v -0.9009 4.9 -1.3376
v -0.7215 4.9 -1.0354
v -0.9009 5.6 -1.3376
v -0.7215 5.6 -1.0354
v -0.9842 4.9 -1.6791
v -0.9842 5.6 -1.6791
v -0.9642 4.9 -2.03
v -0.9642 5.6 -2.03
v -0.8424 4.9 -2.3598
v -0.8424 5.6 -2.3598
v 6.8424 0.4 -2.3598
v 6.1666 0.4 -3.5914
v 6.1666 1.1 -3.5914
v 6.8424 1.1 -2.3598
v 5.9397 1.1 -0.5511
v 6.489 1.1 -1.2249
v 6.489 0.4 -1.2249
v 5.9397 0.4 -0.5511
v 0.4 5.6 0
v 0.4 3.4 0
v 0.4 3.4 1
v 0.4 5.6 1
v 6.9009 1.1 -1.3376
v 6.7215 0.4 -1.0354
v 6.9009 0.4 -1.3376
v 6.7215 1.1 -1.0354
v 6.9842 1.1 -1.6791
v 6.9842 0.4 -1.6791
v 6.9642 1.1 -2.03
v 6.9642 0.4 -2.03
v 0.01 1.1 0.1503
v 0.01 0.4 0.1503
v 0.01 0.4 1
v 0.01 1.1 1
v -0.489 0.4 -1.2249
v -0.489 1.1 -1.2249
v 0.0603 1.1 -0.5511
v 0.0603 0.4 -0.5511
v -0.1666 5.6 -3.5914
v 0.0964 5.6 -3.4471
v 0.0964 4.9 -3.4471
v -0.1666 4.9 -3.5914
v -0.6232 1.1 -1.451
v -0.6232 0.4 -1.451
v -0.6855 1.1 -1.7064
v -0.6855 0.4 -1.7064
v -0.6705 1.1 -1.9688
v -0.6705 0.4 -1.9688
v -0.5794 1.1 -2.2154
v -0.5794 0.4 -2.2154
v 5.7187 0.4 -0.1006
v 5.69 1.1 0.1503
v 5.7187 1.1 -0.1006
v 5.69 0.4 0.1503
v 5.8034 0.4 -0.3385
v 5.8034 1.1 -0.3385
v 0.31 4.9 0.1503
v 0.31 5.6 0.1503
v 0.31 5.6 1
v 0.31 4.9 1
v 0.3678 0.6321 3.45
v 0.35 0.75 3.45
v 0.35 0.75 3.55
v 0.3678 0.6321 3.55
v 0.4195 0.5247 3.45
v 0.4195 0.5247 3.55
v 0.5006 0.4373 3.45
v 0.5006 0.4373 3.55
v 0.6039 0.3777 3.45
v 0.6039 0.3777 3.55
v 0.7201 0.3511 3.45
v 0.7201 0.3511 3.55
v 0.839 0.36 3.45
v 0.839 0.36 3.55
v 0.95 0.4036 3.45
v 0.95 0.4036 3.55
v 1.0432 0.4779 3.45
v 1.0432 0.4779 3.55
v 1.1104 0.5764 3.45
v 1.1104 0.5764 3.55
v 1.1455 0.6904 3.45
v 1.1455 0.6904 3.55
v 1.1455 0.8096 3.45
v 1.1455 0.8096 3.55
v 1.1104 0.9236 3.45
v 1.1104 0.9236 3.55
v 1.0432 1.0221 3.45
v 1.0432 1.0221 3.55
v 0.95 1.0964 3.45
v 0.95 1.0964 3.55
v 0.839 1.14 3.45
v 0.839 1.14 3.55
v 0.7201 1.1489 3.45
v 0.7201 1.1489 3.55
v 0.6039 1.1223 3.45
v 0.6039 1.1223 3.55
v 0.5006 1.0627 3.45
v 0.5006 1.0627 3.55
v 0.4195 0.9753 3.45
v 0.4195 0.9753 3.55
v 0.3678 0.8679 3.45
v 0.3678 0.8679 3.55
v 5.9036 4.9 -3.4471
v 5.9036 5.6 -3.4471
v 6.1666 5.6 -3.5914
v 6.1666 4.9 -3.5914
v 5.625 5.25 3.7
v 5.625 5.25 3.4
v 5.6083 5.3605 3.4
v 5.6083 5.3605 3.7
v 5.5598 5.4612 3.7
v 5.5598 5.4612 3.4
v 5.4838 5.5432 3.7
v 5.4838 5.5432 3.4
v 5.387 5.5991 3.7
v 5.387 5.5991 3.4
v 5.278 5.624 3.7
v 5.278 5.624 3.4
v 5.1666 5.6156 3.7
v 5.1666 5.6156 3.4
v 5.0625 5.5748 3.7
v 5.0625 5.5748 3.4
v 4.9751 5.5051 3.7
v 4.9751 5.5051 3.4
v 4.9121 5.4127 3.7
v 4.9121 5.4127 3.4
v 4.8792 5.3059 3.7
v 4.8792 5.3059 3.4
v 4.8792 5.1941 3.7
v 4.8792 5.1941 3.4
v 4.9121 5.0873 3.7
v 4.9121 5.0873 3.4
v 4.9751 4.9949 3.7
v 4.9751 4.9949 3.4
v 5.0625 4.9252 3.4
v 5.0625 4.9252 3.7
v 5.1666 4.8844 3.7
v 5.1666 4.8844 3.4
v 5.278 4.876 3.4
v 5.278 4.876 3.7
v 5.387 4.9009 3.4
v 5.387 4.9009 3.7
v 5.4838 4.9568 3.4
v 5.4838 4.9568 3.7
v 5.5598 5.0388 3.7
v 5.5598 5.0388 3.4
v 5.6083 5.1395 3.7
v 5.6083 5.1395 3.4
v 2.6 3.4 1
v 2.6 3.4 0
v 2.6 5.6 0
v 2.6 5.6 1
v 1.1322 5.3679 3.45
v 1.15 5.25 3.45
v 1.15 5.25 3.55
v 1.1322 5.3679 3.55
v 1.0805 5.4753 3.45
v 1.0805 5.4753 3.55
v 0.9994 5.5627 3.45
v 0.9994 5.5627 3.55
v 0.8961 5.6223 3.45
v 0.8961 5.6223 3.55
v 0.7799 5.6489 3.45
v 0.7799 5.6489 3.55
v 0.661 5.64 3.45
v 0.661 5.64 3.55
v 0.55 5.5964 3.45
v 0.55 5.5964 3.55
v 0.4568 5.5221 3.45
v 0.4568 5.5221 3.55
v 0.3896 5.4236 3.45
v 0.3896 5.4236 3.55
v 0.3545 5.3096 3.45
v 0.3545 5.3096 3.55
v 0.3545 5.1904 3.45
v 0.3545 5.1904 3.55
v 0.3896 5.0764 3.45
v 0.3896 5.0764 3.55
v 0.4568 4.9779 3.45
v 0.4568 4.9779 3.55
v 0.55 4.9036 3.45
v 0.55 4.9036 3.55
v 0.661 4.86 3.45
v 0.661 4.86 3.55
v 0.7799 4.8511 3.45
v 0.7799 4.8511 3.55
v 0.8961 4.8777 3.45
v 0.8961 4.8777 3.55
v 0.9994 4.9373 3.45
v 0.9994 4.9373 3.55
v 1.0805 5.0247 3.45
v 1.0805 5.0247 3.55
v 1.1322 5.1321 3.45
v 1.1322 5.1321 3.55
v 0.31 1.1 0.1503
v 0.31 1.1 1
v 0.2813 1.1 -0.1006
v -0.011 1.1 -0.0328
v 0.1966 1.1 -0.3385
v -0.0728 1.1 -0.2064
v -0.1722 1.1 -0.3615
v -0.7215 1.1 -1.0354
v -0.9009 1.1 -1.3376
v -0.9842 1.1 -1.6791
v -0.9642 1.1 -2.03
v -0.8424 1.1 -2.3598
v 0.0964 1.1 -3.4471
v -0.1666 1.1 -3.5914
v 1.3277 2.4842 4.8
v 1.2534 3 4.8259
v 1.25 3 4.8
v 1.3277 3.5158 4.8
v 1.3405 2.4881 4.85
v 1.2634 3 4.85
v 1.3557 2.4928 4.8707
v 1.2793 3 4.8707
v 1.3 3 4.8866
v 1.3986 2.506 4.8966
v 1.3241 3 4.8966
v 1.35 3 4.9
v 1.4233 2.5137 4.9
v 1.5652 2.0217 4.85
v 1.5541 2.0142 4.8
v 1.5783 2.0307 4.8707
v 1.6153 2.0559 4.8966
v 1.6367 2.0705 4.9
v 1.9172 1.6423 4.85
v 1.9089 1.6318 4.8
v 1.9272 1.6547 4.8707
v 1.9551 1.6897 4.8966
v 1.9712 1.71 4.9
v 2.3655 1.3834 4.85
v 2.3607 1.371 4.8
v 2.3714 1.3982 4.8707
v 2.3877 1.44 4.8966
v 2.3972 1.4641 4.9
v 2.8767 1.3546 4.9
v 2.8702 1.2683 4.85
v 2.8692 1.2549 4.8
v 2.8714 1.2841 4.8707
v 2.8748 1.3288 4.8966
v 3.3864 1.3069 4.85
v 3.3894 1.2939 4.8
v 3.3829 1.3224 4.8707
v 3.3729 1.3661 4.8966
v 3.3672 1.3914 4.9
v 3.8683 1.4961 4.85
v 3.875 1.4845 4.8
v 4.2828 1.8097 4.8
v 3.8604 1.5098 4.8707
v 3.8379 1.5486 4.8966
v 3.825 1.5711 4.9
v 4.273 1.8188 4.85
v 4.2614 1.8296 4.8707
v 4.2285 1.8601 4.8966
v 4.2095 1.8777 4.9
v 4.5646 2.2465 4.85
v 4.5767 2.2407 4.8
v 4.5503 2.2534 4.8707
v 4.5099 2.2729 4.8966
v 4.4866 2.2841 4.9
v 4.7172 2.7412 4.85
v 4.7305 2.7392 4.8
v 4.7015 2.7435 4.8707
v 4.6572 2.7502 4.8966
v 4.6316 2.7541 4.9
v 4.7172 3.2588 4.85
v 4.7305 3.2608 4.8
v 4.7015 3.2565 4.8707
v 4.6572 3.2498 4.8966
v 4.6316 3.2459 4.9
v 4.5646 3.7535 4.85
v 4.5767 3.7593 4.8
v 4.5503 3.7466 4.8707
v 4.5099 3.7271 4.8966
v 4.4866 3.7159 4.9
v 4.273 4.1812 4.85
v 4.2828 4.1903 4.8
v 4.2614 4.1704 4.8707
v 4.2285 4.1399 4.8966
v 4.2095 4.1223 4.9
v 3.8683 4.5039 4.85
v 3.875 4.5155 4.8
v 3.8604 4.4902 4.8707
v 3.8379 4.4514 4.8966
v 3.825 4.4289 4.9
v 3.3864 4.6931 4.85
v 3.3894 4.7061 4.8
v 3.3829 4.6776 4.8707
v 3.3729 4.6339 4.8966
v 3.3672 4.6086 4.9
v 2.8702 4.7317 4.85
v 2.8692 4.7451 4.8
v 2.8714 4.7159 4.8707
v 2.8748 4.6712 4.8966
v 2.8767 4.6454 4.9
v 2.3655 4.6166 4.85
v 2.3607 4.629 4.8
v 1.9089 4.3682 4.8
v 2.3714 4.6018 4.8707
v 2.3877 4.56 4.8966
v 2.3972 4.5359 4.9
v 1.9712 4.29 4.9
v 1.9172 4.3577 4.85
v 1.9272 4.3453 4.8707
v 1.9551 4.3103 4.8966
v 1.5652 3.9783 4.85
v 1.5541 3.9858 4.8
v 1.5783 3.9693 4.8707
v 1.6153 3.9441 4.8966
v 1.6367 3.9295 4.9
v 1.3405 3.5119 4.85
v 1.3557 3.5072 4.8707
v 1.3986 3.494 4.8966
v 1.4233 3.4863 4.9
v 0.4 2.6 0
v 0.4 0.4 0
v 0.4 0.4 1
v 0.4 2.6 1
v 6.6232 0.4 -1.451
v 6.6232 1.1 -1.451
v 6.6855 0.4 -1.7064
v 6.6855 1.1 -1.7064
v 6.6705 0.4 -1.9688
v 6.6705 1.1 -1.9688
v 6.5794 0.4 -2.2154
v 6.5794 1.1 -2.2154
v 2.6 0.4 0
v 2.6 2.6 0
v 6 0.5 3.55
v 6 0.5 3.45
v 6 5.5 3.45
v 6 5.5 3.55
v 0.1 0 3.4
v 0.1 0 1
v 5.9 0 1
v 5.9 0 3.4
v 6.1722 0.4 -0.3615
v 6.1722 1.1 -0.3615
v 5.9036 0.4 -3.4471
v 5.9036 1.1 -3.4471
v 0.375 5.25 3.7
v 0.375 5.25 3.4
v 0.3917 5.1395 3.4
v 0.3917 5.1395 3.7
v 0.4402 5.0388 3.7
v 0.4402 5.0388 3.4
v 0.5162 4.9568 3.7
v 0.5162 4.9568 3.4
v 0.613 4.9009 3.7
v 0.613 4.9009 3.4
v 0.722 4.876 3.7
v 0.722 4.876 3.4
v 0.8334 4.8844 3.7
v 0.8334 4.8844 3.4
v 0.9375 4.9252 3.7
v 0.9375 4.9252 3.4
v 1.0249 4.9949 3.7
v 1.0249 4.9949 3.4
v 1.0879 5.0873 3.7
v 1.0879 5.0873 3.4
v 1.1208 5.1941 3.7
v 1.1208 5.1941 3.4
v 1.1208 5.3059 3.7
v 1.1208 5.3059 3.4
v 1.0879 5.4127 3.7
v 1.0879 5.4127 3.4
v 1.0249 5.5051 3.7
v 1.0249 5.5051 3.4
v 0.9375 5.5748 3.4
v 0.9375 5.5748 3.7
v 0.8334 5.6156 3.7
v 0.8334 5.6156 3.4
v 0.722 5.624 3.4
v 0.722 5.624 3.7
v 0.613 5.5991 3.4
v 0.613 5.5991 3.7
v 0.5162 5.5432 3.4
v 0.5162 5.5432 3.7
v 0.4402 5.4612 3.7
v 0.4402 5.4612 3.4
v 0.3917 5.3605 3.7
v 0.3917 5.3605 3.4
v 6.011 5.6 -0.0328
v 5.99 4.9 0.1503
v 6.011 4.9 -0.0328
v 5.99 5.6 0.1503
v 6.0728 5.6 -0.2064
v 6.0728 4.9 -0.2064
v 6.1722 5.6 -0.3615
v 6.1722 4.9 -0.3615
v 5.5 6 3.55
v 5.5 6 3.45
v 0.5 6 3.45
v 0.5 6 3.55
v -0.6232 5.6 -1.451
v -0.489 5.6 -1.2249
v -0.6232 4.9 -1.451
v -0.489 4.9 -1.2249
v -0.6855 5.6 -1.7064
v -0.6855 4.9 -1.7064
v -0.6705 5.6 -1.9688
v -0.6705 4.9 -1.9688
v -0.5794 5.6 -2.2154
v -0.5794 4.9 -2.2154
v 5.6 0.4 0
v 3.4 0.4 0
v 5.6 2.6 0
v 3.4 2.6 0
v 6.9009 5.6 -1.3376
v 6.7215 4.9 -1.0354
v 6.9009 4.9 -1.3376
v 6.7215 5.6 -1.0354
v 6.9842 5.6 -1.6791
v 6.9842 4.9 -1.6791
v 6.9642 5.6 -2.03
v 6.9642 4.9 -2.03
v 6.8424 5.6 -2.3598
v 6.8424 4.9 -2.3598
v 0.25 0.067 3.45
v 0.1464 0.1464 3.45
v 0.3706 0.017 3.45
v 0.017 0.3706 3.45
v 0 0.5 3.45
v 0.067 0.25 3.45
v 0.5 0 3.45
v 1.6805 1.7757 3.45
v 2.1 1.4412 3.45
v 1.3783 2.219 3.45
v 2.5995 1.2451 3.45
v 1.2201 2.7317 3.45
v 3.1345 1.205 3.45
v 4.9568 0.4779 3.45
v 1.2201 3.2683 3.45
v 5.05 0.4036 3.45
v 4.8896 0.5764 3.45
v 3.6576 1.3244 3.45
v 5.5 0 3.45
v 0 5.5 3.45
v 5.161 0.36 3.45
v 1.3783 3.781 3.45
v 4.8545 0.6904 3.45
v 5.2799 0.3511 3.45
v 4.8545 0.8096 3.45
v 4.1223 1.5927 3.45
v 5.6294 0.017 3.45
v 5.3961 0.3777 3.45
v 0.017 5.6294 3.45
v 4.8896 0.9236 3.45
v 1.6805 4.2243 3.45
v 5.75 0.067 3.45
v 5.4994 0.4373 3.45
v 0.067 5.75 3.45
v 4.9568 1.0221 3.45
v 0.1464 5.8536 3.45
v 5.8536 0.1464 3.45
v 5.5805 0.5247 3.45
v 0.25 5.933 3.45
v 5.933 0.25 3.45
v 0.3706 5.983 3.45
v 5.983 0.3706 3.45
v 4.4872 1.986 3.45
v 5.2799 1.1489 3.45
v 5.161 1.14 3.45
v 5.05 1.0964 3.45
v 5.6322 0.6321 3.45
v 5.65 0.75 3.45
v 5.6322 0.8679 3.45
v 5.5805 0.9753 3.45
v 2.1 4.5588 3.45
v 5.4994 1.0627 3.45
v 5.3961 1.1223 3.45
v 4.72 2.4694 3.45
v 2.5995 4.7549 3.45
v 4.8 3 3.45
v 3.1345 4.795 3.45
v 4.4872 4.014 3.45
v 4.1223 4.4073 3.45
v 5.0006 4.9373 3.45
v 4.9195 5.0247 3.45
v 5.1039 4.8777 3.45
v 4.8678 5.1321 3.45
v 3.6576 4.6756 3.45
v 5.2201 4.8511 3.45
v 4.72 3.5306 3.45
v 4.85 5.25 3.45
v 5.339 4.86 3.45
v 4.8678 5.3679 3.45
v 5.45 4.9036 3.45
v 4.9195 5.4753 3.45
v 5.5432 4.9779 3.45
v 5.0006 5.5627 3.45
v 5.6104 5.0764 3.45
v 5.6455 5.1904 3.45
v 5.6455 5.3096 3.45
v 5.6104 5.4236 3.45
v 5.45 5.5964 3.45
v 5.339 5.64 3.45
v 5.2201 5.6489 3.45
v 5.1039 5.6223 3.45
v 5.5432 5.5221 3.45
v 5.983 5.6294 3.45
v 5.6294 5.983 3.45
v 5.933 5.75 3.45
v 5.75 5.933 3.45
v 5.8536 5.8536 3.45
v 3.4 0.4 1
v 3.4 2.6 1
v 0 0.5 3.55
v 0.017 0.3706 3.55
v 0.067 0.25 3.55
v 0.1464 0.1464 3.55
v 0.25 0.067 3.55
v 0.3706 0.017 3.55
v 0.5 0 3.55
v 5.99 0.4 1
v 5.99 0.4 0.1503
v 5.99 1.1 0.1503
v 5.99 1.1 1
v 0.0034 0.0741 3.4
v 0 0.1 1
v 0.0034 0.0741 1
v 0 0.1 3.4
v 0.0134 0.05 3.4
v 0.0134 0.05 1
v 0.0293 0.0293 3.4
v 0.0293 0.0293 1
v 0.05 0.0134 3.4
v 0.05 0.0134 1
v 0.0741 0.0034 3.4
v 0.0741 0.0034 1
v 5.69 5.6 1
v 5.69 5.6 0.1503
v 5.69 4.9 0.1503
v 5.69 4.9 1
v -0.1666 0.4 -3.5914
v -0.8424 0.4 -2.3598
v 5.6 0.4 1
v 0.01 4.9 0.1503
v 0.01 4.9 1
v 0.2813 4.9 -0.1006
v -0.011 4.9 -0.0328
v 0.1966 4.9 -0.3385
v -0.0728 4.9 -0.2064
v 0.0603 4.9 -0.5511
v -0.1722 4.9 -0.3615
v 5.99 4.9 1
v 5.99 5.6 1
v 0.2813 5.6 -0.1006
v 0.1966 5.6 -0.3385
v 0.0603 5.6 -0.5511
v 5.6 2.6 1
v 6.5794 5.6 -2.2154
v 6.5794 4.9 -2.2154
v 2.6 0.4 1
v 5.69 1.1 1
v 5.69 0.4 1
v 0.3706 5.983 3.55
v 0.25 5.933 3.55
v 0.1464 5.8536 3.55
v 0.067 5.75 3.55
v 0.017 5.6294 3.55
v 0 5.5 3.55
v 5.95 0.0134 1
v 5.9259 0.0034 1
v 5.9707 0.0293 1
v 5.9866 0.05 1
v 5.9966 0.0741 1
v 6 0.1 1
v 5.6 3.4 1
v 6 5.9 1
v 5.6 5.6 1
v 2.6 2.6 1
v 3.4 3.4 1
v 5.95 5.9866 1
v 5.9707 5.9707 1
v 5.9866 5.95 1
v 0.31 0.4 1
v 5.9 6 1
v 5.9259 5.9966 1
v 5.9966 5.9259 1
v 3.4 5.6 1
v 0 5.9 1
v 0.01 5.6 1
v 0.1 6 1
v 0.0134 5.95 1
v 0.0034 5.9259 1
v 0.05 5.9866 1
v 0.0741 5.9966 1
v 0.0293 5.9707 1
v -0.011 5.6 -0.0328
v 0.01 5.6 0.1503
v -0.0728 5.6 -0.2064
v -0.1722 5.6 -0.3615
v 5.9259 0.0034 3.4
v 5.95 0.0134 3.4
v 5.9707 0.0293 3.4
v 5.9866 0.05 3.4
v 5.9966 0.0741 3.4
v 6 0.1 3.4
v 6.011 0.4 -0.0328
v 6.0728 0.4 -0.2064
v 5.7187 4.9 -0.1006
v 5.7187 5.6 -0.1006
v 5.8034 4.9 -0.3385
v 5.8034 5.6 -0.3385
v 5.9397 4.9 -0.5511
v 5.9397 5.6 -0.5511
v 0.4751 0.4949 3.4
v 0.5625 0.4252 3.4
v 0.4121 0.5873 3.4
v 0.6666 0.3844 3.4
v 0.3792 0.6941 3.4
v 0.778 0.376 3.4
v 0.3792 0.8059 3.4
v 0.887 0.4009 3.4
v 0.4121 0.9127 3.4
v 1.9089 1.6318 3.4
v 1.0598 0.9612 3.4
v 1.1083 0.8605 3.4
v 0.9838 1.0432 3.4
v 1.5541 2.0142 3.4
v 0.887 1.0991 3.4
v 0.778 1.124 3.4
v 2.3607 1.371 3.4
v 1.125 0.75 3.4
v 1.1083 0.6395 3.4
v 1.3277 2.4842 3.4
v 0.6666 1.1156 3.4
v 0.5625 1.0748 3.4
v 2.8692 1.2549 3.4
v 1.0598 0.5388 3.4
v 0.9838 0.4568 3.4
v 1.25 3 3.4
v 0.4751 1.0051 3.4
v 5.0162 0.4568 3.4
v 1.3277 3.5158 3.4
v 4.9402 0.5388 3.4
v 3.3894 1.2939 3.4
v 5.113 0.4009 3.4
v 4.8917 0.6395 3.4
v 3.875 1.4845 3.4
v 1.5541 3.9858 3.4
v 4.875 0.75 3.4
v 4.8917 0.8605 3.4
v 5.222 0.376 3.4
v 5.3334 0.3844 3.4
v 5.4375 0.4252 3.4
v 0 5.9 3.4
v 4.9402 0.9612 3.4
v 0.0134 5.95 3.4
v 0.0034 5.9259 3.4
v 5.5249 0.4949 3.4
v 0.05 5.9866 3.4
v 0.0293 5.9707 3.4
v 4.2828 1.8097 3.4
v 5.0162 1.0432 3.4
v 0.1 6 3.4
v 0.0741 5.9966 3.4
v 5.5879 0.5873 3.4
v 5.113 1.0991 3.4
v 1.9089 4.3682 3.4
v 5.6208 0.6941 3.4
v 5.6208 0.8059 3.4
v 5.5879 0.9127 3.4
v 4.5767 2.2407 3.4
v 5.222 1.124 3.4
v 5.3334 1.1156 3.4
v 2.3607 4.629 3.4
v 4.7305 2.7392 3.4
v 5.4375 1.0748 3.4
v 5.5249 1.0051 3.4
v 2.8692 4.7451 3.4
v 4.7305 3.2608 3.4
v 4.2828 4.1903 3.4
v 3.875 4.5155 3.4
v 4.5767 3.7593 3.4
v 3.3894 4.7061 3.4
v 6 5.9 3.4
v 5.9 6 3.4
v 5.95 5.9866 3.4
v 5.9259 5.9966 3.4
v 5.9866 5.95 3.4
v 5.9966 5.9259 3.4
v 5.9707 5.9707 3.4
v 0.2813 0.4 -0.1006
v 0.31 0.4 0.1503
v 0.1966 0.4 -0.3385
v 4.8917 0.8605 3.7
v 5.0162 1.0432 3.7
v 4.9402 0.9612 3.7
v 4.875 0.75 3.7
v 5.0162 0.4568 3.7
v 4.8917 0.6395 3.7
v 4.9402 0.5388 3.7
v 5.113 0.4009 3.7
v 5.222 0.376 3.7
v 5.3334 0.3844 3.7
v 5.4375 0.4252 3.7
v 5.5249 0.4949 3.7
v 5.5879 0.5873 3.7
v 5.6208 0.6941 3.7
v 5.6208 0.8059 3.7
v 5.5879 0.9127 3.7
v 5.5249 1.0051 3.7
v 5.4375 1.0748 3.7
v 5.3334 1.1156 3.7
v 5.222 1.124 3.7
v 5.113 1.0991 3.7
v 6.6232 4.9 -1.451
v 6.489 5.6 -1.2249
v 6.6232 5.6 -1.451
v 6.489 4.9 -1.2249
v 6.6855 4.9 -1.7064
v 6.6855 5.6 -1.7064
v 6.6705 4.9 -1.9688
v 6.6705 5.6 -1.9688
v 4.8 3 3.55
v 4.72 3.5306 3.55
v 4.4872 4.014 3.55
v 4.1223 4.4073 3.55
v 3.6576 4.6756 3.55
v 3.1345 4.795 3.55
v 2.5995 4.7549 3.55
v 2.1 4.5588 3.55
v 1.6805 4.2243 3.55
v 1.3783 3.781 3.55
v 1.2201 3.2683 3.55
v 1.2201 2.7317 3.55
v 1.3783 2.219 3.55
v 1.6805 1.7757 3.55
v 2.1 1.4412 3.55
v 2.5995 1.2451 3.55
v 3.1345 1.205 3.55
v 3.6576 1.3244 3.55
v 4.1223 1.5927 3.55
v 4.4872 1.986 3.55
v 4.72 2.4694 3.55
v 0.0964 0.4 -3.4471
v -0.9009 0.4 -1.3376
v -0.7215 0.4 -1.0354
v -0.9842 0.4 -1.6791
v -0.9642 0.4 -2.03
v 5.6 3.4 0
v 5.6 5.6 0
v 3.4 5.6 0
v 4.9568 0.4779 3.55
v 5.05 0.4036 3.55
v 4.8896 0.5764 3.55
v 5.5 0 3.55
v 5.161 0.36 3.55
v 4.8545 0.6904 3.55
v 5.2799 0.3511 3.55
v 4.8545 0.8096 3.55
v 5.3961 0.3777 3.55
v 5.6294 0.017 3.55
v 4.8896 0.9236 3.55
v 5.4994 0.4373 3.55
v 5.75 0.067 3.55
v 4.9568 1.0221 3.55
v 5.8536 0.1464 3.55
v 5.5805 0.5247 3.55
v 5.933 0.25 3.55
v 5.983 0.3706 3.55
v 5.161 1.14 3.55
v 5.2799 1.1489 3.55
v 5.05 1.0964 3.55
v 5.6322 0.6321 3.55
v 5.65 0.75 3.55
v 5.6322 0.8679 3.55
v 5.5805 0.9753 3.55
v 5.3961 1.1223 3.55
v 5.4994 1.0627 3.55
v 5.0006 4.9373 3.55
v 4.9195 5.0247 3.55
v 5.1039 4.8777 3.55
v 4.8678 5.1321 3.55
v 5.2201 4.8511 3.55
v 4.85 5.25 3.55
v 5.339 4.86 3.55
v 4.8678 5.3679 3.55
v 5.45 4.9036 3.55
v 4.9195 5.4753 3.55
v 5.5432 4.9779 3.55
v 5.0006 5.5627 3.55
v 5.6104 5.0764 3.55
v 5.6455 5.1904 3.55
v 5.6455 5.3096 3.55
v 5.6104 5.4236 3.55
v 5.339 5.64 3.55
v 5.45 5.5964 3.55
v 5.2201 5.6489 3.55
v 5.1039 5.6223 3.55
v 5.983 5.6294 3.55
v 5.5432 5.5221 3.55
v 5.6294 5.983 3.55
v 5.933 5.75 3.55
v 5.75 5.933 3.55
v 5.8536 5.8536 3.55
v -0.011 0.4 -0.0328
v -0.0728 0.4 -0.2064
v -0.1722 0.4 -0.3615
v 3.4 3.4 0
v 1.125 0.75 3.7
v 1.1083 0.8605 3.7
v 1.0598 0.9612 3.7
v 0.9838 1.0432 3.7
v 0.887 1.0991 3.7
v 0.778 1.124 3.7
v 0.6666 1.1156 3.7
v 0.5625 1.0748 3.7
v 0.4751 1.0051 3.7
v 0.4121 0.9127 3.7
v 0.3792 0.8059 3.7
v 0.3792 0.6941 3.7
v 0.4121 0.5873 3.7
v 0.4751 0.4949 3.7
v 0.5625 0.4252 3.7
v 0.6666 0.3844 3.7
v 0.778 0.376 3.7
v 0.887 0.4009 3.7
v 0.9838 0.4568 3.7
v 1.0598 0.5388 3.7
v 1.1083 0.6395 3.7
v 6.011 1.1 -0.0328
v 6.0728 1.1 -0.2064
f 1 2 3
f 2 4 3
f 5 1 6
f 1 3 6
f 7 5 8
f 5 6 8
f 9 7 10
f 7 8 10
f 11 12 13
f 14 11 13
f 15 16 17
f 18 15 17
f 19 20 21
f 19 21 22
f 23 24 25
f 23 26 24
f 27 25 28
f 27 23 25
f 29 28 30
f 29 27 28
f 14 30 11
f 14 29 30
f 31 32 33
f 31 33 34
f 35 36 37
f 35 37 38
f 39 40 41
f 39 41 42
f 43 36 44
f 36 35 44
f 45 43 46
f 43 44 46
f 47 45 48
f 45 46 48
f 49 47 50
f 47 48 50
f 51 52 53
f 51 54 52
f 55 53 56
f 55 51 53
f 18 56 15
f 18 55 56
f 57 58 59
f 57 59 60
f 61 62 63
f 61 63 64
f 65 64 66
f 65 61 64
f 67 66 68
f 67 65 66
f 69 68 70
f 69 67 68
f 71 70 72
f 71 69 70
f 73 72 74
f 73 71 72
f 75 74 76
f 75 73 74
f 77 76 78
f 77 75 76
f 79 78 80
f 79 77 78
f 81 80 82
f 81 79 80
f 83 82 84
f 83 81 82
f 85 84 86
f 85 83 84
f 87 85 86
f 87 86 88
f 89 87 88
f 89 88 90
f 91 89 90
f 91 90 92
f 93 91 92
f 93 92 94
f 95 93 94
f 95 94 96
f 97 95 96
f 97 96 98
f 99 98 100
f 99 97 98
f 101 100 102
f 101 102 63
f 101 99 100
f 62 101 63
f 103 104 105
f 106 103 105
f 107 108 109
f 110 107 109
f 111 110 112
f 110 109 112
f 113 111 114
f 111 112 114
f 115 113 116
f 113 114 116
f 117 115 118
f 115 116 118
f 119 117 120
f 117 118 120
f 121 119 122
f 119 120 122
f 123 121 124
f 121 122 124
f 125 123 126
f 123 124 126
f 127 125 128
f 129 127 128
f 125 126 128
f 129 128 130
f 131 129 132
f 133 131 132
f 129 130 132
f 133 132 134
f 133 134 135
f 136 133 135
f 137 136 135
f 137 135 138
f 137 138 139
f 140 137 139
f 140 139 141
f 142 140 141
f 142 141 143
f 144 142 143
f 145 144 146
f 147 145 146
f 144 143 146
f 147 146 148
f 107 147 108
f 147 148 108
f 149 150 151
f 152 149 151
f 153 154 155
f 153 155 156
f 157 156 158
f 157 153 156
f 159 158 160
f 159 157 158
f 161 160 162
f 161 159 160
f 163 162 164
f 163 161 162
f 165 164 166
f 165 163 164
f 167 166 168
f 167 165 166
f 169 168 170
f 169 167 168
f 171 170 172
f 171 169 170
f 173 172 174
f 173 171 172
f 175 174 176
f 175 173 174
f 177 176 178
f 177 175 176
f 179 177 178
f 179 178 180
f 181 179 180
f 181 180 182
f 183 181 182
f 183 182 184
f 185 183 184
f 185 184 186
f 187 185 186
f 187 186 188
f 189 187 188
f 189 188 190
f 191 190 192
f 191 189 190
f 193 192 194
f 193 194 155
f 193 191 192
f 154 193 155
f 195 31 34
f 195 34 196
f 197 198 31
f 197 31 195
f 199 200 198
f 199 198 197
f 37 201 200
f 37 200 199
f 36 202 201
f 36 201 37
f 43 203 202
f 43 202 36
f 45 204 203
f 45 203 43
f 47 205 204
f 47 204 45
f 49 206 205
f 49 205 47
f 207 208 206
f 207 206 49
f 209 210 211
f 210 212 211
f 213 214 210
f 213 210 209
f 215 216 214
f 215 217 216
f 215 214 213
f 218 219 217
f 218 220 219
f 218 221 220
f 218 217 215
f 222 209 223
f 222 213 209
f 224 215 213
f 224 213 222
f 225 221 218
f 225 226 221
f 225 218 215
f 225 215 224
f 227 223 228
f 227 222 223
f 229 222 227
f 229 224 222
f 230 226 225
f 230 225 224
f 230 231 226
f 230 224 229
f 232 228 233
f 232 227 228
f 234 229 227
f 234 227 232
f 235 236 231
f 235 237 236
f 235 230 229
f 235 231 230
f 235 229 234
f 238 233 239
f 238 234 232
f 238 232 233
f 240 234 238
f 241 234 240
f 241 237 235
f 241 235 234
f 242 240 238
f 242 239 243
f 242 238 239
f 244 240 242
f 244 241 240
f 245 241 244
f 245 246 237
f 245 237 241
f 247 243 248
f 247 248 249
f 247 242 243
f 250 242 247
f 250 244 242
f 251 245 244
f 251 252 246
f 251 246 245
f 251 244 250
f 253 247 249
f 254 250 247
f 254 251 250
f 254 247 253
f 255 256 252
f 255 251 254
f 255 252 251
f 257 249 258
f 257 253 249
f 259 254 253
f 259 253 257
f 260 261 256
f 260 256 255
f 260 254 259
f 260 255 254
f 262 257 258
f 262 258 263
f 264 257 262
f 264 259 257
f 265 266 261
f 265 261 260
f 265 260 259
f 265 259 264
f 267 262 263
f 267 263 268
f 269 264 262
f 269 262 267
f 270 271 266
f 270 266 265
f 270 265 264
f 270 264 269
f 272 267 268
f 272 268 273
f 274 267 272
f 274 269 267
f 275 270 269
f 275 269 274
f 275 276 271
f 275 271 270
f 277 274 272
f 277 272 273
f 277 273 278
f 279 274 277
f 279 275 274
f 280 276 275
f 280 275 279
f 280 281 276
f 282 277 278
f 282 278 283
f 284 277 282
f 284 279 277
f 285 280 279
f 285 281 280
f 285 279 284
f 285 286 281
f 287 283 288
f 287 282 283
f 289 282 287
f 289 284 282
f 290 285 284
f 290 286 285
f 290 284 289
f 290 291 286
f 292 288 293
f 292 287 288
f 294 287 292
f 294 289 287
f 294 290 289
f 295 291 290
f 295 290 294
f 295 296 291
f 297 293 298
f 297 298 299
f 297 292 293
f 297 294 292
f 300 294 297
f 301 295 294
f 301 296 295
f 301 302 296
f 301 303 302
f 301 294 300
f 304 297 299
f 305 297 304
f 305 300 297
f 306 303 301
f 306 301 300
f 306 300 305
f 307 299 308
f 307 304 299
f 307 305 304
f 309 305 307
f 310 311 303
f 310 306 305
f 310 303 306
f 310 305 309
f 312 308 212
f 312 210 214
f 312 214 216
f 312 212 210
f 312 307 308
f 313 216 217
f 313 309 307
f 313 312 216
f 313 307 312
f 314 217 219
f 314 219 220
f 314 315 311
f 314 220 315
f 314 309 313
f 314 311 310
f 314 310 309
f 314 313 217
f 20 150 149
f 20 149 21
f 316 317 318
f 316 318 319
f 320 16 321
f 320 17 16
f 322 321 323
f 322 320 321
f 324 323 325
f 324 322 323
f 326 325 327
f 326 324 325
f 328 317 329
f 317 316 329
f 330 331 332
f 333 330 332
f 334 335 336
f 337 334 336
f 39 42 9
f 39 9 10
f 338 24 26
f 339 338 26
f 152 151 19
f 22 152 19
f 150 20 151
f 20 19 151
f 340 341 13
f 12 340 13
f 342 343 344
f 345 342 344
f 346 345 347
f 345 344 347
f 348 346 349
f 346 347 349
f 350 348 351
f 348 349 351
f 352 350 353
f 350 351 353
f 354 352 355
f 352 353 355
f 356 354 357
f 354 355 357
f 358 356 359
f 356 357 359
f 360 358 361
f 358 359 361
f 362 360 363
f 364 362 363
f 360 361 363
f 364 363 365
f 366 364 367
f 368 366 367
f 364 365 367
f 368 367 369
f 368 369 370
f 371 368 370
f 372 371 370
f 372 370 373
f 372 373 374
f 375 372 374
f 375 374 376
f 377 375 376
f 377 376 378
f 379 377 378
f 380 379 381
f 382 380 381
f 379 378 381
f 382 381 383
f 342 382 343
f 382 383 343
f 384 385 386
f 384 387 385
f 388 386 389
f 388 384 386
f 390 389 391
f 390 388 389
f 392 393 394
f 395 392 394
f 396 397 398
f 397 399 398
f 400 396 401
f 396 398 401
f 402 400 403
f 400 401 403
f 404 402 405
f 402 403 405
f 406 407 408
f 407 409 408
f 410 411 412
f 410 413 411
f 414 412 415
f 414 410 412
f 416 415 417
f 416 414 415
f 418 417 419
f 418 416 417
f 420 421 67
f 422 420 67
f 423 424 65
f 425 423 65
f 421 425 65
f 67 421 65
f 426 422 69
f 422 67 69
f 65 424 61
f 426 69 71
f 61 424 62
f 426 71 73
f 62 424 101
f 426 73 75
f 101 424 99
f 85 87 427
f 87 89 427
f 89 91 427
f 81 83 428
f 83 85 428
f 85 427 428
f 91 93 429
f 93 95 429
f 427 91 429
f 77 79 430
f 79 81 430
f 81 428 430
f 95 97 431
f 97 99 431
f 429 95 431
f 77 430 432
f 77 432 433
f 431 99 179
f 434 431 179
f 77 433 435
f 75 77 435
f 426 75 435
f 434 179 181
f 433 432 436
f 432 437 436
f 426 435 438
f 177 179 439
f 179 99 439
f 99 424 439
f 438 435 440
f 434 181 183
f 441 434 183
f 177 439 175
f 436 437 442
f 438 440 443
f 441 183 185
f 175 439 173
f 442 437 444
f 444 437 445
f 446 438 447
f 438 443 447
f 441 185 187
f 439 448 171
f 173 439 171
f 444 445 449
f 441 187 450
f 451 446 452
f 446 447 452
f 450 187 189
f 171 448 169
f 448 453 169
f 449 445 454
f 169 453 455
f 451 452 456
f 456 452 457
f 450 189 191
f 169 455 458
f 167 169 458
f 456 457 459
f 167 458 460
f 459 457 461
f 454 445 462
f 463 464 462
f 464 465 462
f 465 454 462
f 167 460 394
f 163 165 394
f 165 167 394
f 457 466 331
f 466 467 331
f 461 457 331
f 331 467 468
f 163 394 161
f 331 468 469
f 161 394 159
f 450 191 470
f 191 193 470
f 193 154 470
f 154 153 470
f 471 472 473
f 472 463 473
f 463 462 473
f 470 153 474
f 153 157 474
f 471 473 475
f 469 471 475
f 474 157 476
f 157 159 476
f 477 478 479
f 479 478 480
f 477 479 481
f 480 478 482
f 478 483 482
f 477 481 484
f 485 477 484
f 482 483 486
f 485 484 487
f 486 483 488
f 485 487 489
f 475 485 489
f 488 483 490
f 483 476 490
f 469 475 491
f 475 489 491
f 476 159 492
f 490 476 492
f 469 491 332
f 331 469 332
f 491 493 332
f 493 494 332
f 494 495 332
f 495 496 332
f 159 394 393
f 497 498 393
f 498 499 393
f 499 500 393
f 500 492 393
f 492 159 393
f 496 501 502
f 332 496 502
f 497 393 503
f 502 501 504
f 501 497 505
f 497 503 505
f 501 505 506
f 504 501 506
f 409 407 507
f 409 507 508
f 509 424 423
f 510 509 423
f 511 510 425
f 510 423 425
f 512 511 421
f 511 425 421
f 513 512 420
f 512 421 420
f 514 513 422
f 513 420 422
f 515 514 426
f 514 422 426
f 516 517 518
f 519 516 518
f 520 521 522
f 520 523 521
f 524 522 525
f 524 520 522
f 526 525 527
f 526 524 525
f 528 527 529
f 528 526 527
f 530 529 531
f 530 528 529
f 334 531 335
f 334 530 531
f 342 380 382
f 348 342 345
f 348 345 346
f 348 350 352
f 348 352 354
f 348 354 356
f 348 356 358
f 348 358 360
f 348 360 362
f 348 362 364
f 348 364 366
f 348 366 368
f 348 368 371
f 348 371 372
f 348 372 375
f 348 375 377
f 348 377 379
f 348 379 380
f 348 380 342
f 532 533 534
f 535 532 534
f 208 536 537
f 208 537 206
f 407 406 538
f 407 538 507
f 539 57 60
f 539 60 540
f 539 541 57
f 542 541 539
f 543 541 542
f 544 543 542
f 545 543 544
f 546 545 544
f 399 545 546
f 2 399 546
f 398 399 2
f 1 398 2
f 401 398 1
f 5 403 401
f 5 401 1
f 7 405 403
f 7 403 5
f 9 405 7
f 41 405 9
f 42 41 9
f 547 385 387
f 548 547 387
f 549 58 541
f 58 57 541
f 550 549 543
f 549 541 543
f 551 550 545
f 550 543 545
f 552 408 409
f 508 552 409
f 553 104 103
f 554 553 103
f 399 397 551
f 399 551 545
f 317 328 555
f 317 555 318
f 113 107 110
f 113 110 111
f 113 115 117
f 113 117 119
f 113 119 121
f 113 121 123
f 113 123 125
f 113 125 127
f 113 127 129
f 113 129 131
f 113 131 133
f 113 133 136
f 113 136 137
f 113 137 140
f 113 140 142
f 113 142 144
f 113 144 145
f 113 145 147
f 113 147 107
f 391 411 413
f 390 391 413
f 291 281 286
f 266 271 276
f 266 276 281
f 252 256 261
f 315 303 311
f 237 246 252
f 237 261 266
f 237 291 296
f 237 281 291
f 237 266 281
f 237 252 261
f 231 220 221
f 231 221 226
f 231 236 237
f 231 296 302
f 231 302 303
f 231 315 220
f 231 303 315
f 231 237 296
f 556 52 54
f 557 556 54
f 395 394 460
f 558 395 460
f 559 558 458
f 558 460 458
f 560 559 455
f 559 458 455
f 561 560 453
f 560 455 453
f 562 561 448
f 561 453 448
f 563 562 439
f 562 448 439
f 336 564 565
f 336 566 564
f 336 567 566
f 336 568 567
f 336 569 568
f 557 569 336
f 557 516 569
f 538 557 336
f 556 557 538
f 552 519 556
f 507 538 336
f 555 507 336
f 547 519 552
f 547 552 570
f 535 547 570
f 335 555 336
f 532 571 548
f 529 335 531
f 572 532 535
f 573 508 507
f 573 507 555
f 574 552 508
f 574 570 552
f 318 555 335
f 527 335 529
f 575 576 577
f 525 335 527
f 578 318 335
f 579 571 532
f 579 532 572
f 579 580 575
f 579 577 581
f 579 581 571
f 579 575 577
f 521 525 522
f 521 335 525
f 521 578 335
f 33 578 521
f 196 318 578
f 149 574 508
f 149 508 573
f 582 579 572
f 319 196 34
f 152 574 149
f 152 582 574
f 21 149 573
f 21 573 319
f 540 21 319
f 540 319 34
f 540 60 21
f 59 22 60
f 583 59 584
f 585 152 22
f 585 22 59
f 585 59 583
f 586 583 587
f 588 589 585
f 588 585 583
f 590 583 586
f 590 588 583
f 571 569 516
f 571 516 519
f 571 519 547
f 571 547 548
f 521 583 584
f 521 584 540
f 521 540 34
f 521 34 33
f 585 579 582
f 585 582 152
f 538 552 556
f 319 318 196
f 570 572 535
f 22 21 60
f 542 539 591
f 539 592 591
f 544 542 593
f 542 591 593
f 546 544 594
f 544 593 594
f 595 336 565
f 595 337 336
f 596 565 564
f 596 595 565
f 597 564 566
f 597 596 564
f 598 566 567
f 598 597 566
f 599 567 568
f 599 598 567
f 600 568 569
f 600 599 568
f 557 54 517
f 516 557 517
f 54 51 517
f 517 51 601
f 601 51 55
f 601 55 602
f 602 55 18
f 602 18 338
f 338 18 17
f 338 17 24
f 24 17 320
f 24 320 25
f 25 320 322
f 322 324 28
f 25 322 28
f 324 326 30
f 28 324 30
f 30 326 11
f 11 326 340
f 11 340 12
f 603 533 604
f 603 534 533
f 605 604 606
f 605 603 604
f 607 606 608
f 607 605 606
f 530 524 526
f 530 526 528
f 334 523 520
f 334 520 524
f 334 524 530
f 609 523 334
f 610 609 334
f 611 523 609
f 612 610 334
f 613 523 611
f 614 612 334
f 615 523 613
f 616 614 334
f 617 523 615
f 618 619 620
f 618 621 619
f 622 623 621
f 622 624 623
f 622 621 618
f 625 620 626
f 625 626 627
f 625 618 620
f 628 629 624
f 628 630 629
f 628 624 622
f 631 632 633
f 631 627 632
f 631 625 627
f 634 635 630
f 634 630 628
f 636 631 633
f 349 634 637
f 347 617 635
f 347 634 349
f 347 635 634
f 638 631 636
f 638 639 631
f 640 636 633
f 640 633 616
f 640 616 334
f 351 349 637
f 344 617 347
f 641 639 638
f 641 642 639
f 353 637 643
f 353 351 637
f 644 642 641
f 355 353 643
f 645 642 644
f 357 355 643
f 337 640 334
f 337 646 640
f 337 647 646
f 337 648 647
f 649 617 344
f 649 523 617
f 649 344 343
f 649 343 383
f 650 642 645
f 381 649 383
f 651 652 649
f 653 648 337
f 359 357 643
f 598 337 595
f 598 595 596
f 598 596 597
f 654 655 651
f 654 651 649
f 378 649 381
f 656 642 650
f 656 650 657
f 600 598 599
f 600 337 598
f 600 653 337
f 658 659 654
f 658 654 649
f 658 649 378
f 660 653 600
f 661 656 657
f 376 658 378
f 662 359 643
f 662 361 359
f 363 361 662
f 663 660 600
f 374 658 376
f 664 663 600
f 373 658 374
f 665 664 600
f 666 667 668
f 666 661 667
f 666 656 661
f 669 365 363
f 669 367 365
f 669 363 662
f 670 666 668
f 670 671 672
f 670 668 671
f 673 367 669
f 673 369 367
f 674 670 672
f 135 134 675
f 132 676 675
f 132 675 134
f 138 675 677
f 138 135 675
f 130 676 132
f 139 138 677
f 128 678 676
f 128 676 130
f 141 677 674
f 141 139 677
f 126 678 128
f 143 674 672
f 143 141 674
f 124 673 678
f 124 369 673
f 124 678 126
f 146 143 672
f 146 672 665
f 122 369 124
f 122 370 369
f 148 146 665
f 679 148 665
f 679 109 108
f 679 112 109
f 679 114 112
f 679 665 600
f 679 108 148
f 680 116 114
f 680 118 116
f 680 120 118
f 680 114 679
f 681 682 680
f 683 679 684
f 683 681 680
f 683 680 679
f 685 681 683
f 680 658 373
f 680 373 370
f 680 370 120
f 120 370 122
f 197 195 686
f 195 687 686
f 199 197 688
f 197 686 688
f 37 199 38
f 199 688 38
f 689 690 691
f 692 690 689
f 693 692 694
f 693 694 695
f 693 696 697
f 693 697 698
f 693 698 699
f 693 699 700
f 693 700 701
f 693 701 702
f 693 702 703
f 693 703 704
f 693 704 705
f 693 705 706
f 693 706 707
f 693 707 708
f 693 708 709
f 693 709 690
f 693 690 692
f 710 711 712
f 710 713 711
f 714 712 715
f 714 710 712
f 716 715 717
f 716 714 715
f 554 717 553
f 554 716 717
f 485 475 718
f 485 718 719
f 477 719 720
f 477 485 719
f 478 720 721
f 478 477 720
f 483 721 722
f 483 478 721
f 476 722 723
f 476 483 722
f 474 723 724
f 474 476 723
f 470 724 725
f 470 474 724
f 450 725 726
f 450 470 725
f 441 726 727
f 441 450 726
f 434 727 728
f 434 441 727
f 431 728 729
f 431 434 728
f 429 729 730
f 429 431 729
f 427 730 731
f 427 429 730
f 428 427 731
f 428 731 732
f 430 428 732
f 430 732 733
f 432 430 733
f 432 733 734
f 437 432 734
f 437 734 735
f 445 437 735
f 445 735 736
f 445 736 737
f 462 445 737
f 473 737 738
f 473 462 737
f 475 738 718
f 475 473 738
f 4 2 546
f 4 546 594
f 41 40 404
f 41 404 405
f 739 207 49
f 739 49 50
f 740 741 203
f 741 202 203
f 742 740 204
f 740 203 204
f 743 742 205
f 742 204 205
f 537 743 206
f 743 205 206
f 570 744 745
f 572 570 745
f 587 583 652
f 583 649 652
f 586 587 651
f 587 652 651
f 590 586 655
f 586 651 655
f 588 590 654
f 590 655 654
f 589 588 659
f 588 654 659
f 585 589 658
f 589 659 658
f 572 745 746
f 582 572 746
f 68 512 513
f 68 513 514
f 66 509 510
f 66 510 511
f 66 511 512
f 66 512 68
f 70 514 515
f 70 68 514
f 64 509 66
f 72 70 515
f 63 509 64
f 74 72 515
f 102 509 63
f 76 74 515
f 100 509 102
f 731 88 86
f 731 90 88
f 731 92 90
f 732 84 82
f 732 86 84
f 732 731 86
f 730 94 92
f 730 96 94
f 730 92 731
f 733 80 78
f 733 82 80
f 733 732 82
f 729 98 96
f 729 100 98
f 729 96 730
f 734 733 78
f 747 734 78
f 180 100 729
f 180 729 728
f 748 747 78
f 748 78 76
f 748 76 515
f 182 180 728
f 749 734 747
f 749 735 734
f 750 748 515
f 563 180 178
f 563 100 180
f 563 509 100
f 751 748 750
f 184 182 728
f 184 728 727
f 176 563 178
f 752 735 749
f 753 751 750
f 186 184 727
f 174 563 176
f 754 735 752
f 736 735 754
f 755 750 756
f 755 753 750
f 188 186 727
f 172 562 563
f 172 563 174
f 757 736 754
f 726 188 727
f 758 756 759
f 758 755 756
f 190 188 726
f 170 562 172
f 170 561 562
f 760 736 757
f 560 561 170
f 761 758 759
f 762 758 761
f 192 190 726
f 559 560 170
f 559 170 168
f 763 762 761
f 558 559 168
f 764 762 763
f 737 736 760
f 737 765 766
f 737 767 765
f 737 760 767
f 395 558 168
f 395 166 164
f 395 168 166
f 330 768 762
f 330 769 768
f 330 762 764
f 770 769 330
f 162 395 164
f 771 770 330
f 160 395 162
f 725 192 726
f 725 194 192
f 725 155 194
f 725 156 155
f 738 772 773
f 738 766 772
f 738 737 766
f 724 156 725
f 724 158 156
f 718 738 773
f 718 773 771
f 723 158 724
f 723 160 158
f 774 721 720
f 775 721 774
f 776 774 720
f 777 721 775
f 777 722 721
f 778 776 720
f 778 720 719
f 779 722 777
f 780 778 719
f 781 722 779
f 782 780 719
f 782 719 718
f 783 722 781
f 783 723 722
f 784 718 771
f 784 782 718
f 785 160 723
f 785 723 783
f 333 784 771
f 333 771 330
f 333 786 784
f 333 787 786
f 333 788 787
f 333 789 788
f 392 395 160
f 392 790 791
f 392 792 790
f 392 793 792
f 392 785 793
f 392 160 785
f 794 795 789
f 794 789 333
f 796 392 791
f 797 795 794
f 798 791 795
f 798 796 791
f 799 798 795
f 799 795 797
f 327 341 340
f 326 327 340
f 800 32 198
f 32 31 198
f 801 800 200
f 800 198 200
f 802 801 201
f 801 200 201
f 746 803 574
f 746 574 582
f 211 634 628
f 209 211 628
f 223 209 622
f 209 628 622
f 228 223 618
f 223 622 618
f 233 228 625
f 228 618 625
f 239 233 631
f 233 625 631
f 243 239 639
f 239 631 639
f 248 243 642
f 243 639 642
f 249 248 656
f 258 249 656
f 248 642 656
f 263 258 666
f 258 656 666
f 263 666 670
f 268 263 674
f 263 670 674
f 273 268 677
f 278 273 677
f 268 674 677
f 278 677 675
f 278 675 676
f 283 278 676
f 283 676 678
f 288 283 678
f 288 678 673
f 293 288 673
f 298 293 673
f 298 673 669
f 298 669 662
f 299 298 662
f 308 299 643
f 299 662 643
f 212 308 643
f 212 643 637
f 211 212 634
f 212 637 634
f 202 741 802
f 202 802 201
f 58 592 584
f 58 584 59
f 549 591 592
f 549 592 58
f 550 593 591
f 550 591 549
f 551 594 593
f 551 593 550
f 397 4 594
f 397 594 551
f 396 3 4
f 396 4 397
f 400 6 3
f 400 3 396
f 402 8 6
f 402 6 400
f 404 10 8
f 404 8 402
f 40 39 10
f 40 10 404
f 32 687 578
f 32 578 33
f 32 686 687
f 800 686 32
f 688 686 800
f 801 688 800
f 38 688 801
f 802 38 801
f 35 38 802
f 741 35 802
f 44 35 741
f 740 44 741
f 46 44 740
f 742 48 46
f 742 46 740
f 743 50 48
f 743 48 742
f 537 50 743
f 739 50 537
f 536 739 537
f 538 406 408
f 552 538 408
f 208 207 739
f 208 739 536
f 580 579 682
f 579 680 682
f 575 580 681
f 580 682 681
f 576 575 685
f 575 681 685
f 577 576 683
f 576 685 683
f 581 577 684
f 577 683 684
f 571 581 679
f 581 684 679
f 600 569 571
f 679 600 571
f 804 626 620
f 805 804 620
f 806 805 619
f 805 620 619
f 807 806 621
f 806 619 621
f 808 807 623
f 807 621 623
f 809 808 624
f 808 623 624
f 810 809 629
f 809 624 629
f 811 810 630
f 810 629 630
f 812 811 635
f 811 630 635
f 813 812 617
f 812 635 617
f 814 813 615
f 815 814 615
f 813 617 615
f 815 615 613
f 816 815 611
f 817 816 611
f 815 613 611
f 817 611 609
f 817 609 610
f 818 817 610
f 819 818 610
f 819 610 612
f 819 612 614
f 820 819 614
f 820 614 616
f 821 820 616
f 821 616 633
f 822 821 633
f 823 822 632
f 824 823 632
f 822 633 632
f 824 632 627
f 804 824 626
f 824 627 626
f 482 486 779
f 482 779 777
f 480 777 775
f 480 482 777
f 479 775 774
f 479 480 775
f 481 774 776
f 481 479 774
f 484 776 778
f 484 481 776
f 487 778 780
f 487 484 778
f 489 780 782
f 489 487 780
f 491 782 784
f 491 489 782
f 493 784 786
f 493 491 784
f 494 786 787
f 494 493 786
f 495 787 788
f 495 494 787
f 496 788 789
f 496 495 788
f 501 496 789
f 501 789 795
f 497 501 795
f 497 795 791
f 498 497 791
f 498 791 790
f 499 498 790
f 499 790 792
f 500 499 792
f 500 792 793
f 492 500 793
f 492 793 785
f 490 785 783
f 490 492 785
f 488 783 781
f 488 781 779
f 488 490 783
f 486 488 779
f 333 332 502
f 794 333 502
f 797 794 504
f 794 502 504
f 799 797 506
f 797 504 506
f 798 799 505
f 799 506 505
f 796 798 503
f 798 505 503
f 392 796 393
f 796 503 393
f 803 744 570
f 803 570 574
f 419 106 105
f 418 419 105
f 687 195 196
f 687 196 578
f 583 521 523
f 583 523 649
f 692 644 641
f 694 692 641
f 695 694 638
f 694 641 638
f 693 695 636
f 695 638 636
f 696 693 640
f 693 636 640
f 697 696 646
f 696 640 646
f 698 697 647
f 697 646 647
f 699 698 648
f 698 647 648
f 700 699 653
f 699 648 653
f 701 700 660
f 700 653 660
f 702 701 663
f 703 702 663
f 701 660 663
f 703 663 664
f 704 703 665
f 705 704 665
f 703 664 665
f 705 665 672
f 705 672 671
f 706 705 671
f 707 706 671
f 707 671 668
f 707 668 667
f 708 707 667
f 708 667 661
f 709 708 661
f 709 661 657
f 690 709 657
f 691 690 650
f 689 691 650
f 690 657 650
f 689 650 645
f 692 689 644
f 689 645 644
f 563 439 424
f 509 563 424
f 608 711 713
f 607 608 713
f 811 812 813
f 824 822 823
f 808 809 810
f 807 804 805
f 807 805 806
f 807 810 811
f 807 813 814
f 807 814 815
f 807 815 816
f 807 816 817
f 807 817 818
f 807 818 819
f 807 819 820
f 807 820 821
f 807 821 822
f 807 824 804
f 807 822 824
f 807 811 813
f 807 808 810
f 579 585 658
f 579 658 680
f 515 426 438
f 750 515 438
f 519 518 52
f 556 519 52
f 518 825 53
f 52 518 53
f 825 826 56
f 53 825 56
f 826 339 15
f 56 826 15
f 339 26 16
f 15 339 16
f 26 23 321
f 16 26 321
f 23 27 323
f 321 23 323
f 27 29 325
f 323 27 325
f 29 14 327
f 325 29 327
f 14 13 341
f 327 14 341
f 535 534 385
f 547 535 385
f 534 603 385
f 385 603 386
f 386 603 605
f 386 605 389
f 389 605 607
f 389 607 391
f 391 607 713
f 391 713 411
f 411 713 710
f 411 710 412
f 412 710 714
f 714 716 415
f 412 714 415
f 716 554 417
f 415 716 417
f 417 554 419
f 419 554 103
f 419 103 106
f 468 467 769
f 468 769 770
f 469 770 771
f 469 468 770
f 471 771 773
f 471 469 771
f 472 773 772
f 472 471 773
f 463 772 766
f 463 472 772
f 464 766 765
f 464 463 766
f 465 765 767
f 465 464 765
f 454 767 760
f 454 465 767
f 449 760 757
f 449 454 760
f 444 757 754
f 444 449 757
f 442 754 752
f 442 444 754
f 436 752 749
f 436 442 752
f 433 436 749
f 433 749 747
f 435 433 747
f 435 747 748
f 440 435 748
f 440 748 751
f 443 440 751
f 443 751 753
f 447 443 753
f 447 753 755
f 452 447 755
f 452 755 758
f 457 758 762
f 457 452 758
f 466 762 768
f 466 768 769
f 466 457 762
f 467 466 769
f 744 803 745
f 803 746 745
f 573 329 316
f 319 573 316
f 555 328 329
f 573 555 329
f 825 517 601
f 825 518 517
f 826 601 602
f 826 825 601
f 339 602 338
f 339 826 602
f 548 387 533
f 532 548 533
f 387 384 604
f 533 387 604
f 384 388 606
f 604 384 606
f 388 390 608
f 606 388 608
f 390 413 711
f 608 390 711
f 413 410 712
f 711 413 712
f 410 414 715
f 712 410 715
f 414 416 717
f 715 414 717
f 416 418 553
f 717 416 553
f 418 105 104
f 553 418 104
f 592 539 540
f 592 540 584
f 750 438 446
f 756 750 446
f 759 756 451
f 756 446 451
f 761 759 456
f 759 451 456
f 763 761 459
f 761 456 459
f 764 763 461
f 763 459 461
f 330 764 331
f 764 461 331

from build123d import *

# Parameters (mm, degrees)
SKETCH_1_W          = 6
SKETCH_1_H          = 6
EXTRUDE_1_DEPTH     = 3.4
SKETCH_2_W          = 6
SKETCH_2_H          = 6
SKETCH_2_W_2        = 2.2
SKETCH_2_H_2        = 2.2
CUT_EXTRUDE_1_DEPTH = 1
EXTRUDE_START       = 0.05
SKETCH_3_R          = 0.4
SKETCH_3_R_2        = 1.8
EXTRUDE_2_DEPTH     = 0.1
SKETCH_4_R          = 1.75
EXTRUDE_3_DEPTH     = 1.5
SKETCH_4_3_R        = 0.375
EXTRUDE_4_DEPTH     = 0.3
SKETCH_7_W          = 0.3
SKETCH_7_H          = 0.7
FILLET_1_R          = 0.1


with BuildPart() as part:
    # Эскиз1 → Бобышка-Вытянуть1 (new body)
    with BuildSketch(Plane.XY):
        with Locations((3, 3)):
            Rectangle(SKETCH_1_W, SKETCH_1_H)
    extrude(amount=EXTRUDE_1_DEPTH)

    # Эскиз2 → Вырез-Вытянуть1 (cut)
    with BuildSketch(Plane(origin=(0, 0, 0), x_dir=(-1, 0, 0), z_dir=(0, 0, -1))):
        with Locations((-3, 3)):
            Rectangle(SKETCH_2_W, SKETCH_2_H)
        with Locations((-1.5, 4.5)):
            Rectangle(SKETCH_2_W_2, SKETCH_2_H_2, mode=Mode.SUBTRACT)
        with Locations((-4.5, 4.5)):
            Rectangle(SKETCH_2_W_2, SKETCH_2_H_2, mode=Mode.SUBTRACT)
        with Locations((-1.5, 1.5)):
            Rectangle(SKETCH_2_W_2, SKETCH_2_H_2, mode=Mode.SUBTRACT)
        with Locations((-4.5, 1.5)):
            Rectangle(SKETCH_2_W_2, SKETCH_2_H_2, mode=Mode.SUBTRACT)
    extrude(amount=-CUT_EXTRUDE_1_DEPTH, mode=Mode.SUBTRACT)

    # Эскиз4 → Бобышка-Вытянуть3 (add)
    with BuildSketch(Plane.XY.offset(3.4)):
        with Locations((3, 3)):
            Circle(SKETCH_4_R)
    extrude(amount=EXTRUDE_3_DEPTH)

    # Эскиз4<3> → Бобышка-Вытянуть4 (add)
    with BuildSketch(Plane.XY.offset(3.4)):
        with Locations((0.75, 5.25)):
            Circle(SKETCH_4_3_R)
        with Locations((5.25, 5.25)):
            Circle(SKETCH_4_3_R)
        with Locations((5.25, 0.75)):
            Circle(SKETCH_4_3_R)
        with Locations((0.75, 0.75)):
            Circle(SKETCH_4_3_R)
    extrude(amount=EXTRUDE_4_DEPTH)

    # По траектории1: sweep along a path in Эскиз5
    with BuildLine(Plane.XZ) as sweep_1_path:
        Line((0.2, 1), (0.2, 0.15026769))
        ThreePointArc((0.2, 0.15026769), (0.142091529, -0.185088166), (-0.0249271, -0.481604132))
        Line((-0.0249271, -0.481604132), (-0.574247112, -1.155416509))
        ThreePointArc((-0.574247112, -1.155416509), (-0.795032605, -1.696370452), (-0.675854547, -2.268361705))
        Line((-0.675854547, -2.268361705), (0, -3.5))
    # Эскиз7 → По траектории1 (sweep)
    with BuildSketch(Plane(origin=(0, 0, 1), x_dir=(-1, 0, 0), z_dir=(0, 0, -1))):
        with Locations((-0.16, 0.75)):
            Rectangle(SKETCH_7_W, SKETCH_7_H)
        with Locations((-0.16, 5.25)):
            Rectangle(SKETCH_7_W, SKETCH_7_H)
    sweep_1 = sweep(path=sweep_1_path.line)

    # Зеркальное отражение1: По траектории1 across plane
    add(sweep_1.mirror(Plane.ZY.offset(-3)))

    # Скругление1
    fillet_1_edges = [part.edges().sort_by_distance(p)[0] for p in [
        (1.25, 3, 4.9),
        (6, 6, 2.2),
        (6, 0, 2.2),
        (0, 0, 2.2),
        (0, 6, 2.2),
    ]]
    fillet(fillet_1_edges, radius=FILLET_1_R)


with BuildPart() as body_2:
    # Эскиз3 → Бобышка-Вытянуть2 (new body)
    with BuildSketch(Plane.XY.offset(3.4).offset(EXTRUDE_START)):
        with BuildLine():
            Line((0.5, 0), (5.5, 0))
            ThreePointArc((5.5, 0), (5.853553391, 0.146446609), (6, 0.5))
            Line((6, 0.5), (6, 5.5))
            ThreePointArc((6, 5.5), (5.853553391, 5.853553391), (5.5, 6))
            Line((5.5, 6), (0.5, 6))
            ThreePointArc((0.5, 6), (0.146446609, 5.853553391), (0, 5.5))
            Line((0, 5.5), (0, 0.5))
            ThreePointArc((0, 0.5), (0.146446609, 0.146446609), (0.5, 0))
        make_face()
        with Locations((0.75, 5.25)):
            Circle(SKETCH_3_R, mode=Mode.SUBTRACT)
        with Locations((5.25, 5.25)):
            Circle(SKETCH_3_R, mode=Mode.SUBTRACT)
        with Locations((5.25, 0.75)):
            Circle(SKETCH_3_R, mode=Mode.SUBTRACT)
        with Locations((0.75, 0.75)):
            Circle(SKETCH_3_R, mode=Mode.SUBTRACT)
        with Locations((3, 3)):
            Circle(SKETCH_3_R_2, mode=Mode.SUBTRACT)
    extrude(amount=EXTRUDE_2_DEPTH)


solid = Compound([part.part, body_2.part])
